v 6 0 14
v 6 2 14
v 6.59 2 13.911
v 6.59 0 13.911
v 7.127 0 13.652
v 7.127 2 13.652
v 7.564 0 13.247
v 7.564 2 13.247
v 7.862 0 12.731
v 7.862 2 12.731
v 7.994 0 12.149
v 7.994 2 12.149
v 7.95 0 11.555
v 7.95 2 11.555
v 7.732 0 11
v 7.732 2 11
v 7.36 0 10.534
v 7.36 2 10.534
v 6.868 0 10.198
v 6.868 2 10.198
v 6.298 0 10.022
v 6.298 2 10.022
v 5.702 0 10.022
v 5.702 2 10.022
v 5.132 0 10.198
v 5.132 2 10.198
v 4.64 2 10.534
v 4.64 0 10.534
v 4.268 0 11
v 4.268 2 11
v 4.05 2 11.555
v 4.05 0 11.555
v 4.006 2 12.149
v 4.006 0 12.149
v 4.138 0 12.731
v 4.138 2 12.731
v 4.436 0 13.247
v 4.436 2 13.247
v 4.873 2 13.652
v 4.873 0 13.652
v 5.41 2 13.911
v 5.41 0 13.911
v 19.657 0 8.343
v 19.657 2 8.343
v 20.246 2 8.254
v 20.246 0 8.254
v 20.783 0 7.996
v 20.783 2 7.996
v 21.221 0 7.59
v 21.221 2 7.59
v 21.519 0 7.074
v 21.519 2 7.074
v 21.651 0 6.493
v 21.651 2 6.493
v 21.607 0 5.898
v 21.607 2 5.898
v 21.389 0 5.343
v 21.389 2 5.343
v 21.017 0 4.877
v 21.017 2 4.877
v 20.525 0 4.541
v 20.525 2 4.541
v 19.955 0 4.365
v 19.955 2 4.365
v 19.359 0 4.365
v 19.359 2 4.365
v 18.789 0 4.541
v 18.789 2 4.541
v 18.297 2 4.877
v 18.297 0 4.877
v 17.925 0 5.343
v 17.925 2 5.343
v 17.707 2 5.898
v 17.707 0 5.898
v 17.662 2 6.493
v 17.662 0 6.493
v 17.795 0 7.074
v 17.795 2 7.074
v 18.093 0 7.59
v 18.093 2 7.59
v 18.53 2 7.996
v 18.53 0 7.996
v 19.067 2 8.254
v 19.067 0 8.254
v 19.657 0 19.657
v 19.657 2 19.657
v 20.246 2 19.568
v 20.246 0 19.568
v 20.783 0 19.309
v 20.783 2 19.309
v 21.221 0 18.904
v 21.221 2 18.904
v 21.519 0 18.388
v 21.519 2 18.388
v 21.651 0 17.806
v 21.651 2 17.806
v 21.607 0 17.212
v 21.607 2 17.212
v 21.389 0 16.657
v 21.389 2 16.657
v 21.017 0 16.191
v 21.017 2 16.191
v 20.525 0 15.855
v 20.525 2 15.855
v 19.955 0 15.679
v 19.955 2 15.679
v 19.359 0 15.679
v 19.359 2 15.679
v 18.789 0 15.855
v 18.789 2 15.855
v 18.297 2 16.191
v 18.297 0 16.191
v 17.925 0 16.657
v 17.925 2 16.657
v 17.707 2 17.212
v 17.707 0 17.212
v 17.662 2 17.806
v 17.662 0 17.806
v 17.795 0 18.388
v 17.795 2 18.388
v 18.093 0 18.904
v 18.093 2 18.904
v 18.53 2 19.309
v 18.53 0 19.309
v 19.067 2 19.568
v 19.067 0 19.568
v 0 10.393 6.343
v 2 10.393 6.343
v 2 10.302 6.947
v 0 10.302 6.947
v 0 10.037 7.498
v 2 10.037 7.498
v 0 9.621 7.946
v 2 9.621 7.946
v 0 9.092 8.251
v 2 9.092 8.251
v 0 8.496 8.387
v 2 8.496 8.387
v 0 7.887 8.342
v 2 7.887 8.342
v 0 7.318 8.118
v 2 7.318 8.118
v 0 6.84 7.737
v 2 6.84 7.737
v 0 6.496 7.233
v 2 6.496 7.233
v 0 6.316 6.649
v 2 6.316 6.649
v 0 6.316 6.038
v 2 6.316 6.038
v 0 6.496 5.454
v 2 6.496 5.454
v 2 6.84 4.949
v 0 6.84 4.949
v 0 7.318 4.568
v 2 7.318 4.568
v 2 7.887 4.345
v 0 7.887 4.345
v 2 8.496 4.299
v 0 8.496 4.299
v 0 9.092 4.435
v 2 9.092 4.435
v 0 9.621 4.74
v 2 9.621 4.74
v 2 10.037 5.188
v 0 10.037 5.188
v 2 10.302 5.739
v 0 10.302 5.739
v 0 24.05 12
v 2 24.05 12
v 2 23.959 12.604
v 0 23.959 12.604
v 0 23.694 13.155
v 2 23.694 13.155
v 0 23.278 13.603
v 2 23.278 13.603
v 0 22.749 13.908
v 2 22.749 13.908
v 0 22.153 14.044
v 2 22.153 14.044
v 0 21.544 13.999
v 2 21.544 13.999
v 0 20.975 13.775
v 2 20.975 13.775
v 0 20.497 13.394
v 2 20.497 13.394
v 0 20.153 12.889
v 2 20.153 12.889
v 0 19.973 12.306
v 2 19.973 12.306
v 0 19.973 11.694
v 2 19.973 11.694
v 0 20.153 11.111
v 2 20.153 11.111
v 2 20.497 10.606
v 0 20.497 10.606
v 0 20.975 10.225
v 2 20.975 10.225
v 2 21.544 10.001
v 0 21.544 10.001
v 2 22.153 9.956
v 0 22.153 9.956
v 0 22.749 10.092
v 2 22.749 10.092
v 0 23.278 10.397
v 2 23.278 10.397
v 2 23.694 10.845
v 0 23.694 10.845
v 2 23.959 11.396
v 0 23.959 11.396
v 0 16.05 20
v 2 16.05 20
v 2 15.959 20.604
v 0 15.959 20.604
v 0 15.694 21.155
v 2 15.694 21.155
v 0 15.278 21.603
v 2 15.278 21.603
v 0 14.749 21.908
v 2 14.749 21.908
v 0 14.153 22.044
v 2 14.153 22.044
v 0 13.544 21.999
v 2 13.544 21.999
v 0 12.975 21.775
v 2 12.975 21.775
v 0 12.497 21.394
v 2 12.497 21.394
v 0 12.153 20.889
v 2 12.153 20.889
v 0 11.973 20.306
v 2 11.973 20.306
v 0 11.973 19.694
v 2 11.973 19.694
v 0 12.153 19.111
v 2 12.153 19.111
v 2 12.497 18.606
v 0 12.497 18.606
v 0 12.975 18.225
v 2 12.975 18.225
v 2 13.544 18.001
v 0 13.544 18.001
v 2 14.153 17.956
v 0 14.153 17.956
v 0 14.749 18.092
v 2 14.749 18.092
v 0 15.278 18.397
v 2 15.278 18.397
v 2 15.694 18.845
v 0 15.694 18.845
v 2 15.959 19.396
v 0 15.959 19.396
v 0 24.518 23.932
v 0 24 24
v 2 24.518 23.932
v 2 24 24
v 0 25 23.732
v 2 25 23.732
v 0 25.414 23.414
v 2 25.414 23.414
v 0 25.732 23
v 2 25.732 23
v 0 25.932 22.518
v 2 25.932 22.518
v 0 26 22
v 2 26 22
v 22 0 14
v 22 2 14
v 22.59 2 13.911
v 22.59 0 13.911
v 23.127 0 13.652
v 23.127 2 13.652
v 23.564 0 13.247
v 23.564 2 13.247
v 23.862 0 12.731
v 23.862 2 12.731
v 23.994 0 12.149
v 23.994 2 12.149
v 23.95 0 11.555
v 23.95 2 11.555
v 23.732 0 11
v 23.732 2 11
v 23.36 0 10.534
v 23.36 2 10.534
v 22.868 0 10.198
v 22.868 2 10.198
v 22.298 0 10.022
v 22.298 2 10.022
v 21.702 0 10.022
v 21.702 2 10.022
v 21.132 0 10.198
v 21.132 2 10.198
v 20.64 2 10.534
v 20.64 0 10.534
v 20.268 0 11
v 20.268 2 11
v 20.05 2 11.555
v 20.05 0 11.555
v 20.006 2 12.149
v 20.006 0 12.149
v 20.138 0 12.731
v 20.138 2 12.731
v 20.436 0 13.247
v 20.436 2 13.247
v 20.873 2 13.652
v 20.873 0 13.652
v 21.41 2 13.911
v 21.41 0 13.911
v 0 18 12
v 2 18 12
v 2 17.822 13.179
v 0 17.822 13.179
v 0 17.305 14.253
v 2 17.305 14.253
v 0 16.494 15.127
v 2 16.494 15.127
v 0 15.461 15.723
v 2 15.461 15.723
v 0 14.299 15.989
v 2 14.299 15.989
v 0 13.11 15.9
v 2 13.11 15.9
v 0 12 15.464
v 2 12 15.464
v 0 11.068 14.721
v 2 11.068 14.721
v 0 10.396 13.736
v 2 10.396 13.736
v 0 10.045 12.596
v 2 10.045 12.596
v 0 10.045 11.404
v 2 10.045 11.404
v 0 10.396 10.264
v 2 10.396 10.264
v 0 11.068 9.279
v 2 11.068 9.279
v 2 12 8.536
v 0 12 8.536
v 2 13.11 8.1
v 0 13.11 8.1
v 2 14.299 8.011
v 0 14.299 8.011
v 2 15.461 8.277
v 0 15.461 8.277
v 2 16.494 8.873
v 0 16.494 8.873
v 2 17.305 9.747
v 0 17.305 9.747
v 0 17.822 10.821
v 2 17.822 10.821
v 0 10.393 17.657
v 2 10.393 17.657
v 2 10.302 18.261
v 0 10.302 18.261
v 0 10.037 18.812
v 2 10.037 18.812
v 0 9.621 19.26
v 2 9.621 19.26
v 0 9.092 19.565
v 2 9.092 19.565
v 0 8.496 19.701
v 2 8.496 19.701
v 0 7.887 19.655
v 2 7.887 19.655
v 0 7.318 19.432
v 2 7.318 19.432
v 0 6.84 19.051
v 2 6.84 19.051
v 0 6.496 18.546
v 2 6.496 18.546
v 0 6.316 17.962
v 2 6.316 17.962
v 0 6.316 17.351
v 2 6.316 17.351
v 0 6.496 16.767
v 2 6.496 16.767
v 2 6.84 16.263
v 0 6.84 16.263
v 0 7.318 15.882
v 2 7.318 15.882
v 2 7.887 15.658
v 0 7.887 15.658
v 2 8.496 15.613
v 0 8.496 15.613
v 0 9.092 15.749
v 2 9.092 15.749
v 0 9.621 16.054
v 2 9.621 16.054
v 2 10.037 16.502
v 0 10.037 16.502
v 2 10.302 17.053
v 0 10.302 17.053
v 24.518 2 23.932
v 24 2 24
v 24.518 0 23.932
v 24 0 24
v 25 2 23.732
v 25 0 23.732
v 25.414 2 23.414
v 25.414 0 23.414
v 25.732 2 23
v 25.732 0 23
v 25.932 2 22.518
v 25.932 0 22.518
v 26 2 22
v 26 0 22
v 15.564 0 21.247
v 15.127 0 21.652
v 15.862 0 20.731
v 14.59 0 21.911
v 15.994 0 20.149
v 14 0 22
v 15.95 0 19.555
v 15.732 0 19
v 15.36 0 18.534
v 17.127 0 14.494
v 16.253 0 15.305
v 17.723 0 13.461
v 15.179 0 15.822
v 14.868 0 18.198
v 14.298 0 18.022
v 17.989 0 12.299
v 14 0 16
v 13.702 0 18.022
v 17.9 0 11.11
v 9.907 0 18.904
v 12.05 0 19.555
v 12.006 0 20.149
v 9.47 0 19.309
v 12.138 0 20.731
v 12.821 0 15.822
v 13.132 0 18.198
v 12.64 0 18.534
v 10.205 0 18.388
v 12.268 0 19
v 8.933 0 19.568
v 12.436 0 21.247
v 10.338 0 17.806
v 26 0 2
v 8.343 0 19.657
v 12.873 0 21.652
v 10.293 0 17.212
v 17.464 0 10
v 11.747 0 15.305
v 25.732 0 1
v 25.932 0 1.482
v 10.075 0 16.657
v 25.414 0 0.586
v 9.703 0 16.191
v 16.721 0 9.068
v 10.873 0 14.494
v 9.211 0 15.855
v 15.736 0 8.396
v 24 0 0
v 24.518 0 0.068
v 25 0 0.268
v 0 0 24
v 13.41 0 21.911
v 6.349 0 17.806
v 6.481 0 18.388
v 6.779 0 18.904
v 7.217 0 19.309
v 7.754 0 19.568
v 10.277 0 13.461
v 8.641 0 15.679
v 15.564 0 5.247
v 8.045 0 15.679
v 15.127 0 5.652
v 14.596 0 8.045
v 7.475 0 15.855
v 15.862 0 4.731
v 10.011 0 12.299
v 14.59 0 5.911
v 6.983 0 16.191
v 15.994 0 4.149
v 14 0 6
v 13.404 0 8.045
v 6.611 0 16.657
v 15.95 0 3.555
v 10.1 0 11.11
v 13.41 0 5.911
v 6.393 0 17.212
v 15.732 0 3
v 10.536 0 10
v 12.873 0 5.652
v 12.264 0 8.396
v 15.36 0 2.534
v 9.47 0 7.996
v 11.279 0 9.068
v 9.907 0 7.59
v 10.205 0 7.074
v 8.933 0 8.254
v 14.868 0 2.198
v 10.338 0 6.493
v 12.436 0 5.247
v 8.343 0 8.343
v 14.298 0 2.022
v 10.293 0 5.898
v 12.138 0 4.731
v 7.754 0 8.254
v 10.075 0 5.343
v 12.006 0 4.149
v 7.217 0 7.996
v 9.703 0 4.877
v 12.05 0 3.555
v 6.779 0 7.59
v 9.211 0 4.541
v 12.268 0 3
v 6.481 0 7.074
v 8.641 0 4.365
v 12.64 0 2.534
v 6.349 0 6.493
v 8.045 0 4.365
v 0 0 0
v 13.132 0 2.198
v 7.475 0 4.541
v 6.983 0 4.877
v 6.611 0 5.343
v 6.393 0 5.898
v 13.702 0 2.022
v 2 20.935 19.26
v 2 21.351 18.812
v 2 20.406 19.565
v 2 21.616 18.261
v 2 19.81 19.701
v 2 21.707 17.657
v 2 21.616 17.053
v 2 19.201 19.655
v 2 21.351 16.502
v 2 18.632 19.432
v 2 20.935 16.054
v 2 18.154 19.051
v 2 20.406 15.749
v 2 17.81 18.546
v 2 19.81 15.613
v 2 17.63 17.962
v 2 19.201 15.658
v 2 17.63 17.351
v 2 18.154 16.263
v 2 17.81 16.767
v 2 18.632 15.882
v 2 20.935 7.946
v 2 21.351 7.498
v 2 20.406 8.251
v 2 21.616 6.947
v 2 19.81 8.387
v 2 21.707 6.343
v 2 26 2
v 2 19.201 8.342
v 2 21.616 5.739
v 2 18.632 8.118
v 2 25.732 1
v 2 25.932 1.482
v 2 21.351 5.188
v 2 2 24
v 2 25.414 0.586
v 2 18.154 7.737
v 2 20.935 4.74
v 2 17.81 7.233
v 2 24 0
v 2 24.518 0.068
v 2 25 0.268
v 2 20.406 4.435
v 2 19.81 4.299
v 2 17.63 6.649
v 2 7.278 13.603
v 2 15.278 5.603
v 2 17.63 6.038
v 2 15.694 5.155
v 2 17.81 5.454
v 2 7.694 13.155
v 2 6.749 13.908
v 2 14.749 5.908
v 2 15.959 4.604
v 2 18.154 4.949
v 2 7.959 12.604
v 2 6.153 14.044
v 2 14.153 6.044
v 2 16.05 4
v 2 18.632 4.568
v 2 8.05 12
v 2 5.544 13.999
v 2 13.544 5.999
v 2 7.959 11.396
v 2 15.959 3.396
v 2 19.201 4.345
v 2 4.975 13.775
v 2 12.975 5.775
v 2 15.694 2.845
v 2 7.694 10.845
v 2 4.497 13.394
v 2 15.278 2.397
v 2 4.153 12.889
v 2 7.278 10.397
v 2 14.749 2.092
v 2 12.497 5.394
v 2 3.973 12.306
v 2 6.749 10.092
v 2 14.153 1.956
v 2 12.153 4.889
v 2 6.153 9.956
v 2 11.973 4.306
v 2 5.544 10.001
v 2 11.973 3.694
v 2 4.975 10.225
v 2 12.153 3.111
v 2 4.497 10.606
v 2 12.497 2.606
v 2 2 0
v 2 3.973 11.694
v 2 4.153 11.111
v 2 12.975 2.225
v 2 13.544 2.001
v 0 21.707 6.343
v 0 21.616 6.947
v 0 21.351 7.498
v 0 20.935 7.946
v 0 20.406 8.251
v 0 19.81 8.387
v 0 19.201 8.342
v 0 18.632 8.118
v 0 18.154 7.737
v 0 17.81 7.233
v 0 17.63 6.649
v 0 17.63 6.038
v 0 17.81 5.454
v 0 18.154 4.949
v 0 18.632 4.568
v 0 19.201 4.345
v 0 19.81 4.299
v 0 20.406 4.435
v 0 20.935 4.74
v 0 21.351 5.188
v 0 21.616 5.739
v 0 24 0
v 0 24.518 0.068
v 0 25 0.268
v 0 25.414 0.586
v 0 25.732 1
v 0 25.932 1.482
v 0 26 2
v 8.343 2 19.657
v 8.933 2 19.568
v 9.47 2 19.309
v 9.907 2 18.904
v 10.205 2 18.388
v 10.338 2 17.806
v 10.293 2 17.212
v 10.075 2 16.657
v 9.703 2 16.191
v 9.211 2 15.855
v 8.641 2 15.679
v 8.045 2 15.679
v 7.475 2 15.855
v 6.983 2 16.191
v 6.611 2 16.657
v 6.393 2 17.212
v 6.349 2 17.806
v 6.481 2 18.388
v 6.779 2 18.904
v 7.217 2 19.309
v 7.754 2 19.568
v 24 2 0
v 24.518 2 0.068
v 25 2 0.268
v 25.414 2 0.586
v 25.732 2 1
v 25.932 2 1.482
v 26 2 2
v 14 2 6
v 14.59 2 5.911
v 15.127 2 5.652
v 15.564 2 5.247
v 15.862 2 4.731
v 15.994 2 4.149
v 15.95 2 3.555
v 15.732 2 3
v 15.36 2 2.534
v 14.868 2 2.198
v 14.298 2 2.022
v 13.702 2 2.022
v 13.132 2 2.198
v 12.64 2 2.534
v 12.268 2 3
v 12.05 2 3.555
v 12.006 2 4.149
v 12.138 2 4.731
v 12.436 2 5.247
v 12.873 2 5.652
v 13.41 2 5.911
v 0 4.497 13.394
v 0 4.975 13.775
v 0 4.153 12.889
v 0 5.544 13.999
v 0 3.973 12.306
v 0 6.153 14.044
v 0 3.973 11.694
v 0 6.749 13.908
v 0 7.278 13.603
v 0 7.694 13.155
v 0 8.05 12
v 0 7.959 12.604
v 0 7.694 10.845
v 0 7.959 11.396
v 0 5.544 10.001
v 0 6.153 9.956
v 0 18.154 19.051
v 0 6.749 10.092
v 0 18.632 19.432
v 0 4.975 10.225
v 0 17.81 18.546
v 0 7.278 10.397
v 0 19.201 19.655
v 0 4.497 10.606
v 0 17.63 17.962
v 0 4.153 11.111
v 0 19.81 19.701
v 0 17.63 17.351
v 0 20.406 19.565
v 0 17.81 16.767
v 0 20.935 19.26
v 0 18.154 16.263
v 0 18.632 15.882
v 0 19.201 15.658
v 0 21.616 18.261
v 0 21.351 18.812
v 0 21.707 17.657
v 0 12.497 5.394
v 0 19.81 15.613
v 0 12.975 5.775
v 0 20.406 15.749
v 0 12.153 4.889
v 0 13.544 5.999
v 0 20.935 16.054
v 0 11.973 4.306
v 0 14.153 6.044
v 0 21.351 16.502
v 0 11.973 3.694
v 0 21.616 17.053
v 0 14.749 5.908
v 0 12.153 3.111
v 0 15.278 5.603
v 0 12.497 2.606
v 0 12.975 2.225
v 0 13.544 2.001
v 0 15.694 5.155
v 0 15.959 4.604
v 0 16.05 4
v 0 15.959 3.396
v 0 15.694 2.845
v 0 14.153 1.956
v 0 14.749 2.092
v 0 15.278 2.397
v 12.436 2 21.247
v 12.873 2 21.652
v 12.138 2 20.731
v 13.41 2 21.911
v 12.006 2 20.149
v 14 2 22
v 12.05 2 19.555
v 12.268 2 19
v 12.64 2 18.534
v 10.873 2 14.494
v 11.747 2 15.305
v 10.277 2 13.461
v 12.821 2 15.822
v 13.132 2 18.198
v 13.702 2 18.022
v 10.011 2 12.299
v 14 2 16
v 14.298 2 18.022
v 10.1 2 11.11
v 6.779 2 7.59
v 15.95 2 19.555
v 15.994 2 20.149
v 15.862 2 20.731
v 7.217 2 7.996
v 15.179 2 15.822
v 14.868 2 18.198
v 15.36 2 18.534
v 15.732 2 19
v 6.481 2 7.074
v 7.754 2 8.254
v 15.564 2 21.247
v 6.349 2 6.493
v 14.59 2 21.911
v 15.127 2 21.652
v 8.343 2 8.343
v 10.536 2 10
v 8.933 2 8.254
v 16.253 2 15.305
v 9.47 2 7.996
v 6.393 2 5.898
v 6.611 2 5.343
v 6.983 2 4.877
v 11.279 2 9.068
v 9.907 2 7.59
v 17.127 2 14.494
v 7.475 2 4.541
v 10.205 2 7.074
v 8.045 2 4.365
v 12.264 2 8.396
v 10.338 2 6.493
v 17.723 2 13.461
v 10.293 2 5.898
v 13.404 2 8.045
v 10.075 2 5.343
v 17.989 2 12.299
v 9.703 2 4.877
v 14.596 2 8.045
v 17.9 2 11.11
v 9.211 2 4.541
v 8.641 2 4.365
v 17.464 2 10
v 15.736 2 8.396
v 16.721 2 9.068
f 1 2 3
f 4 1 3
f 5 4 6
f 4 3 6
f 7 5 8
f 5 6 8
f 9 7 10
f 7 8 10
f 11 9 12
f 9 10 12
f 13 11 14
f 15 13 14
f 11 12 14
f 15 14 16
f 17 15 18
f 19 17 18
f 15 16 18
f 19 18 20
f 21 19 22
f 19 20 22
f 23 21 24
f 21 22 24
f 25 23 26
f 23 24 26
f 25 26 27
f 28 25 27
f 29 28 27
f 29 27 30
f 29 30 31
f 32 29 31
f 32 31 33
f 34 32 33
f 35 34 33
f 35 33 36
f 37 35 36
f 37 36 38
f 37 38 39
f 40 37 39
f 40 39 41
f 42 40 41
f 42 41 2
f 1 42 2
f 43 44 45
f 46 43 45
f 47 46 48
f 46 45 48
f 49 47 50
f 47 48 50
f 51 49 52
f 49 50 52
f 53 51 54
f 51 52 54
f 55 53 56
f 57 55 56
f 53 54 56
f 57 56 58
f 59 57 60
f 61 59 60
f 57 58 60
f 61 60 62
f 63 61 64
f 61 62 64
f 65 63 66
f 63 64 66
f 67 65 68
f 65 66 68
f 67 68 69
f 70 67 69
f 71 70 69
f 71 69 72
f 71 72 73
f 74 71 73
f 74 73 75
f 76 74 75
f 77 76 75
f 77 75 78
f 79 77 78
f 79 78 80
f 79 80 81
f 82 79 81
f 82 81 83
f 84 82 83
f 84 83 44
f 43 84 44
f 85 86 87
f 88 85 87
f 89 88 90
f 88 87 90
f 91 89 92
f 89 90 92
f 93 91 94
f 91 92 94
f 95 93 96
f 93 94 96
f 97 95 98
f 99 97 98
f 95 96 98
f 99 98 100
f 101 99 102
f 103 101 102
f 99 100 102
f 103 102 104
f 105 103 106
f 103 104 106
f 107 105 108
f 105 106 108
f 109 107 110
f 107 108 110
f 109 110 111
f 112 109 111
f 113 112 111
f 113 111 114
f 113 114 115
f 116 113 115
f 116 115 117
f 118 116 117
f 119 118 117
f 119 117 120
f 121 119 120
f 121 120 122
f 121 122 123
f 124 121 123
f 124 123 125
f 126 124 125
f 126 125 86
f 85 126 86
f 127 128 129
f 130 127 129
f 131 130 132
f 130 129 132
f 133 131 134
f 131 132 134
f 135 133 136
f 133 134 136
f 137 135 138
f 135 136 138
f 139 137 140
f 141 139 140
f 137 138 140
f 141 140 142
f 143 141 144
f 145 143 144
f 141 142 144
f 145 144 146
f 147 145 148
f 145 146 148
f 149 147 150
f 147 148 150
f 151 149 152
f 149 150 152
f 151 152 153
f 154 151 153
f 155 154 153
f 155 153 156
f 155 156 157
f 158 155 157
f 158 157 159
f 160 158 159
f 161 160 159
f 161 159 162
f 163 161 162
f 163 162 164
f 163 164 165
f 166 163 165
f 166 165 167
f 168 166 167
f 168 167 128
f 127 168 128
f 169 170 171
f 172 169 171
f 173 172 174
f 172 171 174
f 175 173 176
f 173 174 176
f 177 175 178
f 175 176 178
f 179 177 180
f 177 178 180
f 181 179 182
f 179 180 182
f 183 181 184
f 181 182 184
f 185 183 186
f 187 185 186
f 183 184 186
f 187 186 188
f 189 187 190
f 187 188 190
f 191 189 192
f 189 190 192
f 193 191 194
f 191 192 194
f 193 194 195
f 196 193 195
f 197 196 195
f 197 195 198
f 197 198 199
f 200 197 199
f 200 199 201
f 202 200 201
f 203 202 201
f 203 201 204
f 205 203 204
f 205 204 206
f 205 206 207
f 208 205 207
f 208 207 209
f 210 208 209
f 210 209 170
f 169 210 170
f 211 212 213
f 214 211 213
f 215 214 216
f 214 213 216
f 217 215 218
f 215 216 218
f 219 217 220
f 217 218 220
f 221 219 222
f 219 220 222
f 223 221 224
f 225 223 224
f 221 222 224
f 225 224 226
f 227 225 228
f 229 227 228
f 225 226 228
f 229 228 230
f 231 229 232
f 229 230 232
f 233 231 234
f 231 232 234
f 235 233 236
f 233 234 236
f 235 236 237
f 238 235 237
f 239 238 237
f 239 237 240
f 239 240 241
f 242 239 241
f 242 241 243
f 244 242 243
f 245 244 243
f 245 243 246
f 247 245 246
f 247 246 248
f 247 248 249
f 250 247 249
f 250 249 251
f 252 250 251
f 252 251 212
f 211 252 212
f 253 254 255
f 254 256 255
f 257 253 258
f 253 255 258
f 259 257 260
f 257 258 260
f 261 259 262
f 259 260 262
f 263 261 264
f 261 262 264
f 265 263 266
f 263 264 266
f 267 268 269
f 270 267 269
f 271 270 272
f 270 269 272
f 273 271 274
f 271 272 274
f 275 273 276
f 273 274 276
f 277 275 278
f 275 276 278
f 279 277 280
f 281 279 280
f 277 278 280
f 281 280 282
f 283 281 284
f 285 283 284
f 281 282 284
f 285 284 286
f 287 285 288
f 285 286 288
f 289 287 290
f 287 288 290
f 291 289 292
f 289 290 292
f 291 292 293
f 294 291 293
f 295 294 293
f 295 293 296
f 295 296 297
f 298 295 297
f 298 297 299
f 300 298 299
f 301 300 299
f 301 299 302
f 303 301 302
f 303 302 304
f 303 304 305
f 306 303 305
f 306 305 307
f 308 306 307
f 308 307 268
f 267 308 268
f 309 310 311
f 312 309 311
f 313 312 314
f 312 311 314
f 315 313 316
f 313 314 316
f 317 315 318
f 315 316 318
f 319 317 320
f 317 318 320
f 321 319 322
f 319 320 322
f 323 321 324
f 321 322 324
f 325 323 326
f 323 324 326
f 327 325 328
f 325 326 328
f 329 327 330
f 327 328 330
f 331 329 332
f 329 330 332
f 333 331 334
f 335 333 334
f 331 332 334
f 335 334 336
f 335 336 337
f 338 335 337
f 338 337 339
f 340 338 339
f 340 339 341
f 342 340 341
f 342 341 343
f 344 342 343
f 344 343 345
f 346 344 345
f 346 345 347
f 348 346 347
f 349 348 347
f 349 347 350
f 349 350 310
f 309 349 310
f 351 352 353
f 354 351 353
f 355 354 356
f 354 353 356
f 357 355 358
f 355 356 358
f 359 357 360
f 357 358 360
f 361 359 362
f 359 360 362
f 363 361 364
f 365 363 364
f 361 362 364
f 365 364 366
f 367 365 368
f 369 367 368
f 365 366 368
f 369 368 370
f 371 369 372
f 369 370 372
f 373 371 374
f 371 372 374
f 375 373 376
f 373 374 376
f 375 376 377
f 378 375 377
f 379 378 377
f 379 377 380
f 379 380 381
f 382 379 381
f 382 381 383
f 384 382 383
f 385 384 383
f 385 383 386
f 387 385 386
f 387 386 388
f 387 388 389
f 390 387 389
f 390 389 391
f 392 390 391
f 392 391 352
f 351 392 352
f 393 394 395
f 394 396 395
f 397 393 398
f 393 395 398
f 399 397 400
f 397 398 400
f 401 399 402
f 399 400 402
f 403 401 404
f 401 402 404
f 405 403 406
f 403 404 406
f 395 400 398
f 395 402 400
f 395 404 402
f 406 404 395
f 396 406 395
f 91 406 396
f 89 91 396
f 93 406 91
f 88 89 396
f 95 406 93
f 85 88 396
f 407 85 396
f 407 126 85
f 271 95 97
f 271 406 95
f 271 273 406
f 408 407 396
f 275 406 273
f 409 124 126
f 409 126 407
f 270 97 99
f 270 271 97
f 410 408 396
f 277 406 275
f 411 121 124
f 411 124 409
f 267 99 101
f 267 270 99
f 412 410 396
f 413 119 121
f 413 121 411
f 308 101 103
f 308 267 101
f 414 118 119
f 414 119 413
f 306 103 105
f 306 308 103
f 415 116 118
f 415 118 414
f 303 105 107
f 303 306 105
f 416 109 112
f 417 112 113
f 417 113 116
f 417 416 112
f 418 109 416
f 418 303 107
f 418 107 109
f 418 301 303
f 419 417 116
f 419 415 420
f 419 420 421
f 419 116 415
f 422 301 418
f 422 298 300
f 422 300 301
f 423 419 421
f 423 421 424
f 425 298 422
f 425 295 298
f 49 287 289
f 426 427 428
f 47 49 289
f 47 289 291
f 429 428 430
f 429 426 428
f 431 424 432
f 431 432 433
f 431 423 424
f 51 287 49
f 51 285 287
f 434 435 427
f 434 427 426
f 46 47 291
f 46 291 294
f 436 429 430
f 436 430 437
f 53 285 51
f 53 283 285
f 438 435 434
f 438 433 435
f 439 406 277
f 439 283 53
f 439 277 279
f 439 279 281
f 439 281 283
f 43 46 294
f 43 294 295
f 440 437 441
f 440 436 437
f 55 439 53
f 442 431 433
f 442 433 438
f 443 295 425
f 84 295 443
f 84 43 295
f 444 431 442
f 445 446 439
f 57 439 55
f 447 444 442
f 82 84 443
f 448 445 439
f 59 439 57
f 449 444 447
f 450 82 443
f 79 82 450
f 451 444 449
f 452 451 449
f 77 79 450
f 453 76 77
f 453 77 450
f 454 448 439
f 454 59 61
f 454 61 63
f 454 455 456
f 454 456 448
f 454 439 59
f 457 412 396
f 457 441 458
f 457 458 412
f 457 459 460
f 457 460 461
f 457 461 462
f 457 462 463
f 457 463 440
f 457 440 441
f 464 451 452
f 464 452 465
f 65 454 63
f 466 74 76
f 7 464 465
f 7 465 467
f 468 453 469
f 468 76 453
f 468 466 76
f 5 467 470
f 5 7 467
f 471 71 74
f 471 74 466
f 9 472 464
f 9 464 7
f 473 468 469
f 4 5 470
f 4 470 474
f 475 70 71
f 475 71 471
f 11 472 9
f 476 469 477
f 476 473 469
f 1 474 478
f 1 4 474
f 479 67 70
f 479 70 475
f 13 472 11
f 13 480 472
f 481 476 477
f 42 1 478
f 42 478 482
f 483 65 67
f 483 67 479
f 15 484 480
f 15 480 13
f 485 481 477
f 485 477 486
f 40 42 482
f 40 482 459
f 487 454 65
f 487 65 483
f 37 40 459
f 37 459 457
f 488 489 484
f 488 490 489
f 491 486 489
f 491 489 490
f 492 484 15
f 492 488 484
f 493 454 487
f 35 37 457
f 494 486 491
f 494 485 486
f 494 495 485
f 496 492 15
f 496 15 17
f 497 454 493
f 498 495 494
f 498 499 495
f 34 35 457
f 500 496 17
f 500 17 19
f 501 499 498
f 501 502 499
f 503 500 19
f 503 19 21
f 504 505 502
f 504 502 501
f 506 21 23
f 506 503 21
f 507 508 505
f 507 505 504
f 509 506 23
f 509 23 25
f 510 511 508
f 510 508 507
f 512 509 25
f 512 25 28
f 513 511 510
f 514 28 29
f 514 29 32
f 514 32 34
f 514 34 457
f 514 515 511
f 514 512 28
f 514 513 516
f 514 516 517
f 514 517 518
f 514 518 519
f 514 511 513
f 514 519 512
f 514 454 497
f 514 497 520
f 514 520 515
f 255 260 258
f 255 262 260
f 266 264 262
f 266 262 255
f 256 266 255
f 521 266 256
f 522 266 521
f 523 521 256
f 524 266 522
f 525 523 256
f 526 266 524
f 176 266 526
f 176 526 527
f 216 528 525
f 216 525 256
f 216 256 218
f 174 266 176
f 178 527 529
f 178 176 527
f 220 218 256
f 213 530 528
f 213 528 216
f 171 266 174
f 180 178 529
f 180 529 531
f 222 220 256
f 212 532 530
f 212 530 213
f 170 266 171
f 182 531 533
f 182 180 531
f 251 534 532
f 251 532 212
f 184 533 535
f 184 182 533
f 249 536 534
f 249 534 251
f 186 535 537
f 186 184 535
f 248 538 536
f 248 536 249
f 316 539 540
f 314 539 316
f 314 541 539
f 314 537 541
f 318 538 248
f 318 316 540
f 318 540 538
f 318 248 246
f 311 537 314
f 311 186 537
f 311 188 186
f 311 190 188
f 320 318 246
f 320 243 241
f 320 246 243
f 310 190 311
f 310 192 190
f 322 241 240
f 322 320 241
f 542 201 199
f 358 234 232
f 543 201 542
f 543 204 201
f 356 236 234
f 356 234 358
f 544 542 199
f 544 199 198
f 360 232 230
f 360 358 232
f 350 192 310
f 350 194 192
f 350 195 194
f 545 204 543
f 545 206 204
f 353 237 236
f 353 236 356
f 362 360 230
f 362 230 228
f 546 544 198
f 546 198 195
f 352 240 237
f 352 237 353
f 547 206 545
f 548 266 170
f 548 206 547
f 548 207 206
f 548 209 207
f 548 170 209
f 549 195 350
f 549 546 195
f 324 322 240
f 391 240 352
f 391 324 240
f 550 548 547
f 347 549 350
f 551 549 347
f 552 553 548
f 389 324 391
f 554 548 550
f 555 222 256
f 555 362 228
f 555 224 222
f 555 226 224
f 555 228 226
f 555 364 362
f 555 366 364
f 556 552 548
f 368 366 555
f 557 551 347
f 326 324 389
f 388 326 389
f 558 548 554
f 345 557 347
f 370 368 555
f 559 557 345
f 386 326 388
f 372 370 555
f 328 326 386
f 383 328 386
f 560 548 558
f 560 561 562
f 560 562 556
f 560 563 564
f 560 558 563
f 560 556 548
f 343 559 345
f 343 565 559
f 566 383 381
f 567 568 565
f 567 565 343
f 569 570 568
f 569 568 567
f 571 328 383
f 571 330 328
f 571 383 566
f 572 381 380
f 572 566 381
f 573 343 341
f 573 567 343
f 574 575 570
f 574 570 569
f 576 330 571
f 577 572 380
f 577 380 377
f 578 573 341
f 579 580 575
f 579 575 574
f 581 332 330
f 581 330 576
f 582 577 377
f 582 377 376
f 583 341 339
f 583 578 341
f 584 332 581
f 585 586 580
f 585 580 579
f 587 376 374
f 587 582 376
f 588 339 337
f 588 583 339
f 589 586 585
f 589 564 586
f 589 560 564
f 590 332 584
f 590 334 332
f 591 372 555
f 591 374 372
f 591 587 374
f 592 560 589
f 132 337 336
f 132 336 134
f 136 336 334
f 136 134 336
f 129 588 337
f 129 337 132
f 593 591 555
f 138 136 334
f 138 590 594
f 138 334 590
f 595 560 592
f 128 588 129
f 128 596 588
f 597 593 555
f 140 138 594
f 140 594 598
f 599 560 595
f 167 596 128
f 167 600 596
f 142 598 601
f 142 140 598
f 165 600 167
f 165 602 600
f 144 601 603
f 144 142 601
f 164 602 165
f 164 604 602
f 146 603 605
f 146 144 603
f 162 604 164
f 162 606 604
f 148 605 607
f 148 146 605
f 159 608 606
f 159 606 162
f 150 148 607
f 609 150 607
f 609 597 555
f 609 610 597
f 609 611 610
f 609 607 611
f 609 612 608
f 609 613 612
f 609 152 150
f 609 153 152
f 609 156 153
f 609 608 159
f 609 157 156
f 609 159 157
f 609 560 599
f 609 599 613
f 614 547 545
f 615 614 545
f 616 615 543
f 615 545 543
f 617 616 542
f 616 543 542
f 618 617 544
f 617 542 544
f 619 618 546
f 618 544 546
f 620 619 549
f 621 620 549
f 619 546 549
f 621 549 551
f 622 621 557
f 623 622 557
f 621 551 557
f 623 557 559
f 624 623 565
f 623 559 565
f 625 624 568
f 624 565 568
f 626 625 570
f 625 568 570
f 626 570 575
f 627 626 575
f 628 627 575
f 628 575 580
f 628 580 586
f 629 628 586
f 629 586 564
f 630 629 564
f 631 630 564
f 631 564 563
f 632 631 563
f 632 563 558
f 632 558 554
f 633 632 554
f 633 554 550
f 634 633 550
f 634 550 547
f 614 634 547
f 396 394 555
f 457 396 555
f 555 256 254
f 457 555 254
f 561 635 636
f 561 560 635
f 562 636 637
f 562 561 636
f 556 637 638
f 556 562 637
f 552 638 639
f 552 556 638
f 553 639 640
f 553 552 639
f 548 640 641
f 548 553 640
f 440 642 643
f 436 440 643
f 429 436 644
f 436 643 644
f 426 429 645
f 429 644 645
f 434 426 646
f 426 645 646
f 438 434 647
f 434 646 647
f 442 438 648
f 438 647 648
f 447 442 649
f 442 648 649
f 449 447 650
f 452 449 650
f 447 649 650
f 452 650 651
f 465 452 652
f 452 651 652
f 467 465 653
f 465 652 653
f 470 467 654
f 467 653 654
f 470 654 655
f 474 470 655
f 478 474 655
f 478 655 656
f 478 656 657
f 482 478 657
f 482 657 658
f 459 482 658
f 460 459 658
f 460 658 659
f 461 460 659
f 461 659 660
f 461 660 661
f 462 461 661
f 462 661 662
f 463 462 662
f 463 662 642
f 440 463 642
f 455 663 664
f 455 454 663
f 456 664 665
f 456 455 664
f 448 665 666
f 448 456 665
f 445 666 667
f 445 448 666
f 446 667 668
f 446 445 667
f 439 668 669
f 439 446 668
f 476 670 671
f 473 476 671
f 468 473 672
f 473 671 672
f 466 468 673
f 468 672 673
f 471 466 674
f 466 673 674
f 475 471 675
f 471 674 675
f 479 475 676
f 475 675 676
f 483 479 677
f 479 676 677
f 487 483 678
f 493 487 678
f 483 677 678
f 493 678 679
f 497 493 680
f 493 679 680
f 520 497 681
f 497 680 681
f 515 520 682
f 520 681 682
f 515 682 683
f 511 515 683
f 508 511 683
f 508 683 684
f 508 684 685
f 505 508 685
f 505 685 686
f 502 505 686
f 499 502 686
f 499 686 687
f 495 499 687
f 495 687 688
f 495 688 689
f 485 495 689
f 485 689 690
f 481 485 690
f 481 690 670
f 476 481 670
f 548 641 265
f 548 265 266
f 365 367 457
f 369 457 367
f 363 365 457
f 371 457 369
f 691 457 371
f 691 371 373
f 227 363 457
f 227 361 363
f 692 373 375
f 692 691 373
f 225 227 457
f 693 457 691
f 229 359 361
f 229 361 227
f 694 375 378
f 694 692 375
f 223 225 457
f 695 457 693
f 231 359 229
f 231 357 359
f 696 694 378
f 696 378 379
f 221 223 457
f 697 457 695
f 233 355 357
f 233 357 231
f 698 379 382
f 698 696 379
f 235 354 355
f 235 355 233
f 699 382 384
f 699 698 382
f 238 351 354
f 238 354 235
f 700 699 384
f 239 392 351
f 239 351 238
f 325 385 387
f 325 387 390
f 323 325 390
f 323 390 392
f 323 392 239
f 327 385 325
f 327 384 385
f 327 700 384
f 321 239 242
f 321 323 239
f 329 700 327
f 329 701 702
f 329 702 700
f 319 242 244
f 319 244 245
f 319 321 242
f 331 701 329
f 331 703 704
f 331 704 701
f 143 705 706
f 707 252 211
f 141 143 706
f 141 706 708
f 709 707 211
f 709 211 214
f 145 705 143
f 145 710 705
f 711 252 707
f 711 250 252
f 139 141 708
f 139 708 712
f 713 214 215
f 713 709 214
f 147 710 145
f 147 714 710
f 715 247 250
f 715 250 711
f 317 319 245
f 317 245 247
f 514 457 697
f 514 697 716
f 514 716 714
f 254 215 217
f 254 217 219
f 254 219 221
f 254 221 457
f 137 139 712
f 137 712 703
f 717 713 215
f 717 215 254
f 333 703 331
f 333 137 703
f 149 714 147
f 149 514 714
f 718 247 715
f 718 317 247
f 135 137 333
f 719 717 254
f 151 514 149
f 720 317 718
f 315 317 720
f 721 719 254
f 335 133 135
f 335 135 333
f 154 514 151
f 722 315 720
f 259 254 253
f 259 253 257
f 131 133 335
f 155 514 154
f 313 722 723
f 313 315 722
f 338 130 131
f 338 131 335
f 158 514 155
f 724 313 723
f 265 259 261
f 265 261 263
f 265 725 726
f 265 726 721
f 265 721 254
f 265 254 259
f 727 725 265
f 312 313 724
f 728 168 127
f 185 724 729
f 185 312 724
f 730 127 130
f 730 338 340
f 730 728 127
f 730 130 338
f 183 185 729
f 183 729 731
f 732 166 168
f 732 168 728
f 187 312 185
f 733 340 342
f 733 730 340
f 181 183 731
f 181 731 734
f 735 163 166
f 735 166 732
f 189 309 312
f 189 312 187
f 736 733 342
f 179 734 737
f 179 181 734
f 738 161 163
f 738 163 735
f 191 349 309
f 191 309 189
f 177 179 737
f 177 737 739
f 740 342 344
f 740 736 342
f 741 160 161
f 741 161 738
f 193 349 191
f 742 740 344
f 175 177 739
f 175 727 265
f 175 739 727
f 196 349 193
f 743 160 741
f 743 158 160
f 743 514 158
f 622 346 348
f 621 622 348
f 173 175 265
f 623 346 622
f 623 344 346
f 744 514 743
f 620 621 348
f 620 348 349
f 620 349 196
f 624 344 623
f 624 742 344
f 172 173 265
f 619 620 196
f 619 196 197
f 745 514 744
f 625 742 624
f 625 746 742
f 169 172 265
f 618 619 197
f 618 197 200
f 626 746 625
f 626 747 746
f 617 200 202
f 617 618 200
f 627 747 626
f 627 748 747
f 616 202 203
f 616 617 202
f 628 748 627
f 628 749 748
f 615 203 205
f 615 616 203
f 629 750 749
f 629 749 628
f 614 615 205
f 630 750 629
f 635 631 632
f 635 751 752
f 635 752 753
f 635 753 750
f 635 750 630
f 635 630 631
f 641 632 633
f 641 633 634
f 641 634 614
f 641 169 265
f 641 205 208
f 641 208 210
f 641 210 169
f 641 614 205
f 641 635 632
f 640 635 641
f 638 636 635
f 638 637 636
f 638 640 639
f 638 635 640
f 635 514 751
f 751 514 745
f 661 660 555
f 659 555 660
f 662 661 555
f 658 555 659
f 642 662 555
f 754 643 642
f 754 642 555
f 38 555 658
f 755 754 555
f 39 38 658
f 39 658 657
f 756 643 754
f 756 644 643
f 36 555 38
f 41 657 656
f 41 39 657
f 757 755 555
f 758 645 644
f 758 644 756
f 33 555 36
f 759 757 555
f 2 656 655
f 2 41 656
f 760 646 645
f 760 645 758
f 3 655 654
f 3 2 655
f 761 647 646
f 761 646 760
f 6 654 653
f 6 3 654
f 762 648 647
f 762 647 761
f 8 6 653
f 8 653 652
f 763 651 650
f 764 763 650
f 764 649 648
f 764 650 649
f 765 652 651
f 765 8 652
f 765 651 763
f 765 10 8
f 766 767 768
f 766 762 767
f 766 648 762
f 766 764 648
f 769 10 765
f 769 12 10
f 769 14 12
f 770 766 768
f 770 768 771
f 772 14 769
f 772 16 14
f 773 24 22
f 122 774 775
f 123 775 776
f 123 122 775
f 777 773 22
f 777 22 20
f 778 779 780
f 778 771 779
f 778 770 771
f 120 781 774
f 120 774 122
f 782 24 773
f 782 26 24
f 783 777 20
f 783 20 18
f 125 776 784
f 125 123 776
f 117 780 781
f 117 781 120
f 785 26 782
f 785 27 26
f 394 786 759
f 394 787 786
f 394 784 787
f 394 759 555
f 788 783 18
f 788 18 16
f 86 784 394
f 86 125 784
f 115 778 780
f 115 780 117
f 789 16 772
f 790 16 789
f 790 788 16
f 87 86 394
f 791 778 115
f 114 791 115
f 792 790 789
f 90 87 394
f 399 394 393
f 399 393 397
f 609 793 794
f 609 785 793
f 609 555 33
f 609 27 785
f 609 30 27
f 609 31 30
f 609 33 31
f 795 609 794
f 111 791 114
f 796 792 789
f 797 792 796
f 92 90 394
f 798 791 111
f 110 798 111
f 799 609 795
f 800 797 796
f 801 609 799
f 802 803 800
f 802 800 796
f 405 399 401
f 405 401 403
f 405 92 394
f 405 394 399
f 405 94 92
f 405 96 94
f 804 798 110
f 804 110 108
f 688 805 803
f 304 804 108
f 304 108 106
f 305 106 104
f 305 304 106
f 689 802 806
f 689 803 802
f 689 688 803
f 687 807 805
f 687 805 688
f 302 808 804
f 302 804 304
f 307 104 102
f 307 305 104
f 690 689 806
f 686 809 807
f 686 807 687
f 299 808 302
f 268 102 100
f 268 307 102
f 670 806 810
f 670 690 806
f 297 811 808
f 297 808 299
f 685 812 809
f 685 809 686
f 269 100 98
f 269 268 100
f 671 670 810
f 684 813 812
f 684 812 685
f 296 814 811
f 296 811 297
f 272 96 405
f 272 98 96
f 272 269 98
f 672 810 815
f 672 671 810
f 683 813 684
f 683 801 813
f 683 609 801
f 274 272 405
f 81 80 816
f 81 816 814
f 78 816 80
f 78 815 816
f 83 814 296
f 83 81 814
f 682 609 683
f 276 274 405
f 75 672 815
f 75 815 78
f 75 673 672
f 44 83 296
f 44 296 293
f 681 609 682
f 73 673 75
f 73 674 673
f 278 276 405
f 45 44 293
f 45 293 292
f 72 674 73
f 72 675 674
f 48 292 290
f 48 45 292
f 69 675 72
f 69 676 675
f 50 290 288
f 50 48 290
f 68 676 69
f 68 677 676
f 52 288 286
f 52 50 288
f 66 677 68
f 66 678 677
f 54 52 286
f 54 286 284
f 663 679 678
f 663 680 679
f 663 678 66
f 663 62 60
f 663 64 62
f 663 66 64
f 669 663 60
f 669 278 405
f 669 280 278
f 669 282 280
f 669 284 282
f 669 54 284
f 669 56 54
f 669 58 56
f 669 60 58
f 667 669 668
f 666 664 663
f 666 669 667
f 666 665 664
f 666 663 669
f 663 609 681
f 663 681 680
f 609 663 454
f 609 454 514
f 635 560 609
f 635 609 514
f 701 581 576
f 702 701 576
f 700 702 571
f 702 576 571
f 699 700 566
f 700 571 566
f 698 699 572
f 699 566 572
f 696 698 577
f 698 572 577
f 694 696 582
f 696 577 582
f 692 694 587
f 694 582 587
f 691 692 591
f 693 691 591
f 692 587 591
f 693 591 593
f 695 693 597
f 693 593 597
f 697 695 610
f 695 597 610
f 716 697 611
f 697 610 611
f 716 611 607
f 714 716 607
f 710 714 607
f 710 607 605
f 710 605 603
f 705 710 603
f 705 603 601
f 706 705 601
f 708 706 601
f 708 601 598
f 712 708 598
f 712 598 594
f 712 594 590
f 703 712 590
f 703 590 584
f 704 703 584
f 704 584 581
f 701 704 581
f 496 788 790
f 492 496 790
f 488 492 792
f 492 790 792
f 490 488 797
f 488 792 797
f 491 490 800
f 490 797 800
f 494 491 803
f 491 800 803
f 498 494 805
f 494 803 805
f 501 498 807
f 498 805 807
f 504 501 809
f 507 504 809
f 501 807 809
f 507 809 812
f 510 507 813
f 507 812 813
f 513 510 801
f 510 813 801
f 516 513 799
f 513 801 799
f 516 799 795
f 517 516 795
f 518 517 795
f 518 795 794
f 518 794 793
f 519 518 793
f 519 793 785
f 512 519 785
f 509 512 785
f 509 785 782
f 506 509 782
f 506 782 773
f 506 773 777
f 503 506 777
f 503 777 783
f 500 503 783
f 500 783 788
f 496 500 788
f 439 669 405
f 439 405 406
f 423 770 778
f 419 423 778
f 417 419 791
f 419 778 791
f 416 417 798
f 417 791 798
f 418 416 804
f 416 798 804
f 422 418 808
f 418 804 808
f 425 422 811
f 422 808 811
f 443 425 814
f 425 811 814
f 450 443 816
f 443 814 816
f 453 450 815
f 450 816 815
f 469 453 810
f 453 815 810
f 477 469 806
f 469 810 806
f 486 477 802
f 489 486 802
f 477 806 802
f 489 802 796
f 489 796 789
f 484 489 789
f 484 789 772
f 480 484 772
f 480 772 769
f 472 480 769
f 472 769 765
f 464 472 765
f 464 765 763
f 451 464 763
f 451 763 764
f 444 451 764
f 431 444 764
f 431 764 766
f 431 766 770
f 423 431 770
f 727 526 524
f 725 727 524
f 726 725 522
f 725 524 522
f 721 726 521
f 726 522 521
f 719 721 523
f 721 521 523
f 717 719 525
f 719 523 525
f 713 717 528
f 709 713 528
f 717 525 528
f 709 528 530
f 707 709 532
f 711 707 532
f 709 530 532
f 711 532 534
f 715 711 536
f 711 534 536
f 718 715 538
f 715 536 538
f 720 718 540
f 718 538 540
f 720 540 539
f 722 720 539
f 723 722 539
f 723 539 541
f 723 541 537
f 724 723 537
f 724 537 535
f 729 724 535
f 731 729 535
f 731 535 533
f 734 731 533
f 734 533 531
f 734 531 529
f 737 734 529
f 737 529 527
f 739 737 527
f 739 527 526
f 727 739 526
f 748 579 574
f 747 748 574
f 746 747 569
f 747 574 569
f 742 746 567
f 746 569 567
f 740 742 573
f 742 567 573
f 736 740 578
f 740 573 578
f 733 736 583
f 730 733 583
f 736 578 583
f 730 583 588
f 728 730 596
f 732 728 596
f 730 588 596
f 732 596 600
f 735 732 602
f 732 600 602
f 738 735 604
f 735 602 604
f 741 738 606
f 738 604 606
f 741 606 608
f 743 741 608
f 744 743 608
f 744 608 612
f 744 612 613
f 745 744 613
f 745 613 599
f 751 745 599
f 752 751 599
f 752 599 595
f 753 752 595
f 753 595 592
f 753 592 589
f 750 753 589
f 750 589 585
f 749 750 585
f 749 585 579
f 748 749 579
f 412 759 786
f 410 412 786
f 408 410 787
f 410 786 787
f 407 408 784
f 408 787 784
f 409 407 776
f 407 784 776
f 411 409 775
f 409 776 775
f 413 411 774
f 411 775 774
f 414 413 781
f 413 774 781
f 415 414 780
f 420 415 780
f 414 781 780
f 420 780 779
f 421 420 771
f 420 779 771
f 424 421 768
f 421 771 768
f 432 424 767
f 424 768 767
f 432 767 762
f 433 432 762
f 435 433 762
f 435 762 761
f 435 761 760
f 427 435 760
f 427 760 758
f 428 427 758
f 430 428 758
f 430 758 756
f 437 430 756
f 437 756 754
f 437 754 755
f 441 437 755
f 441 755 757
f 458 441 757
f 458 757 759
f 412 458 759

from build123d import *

# Parameters (mm, degrees)
BOSS_EXTRUDE1_DEPTH = 24
SKETCH2_R           = 2.05
SKETCH2_R_2         = 4
CUT_EXTRUDE1_DEPTH  = 43.755116653
SKETCH3_R           = 4
SKETCH3_R_2         = 2
CUT_EXTRUDE2_DEPTH  = 43.755116653
FILLET1_R           = 2


with BuildPart() as part:
    # Sketch1 → Boss-Extrude1 (new body)
    with BuildSketch(Plane.XY):
        Polygon((0, 0), (0, 26), (2, 26), (2, 2), (26, 2), (26, 0), align=None)
    extrude(amount=BOSS_EXTRUDE1_DEPTH)

    # Sketch2 → Cut-Extrude1 (cut, through all)
    with BuildSketch(Plane(origin=(2, 0, 0), x_dir=(0, 0, -1), z_dir=(1, 0, 0))):
        with Locations(Location((-12, 22, 0), (0, 0, 90))):
            Circle(SKETCH2_R)
        with Locations(Location((-12, 14, 0), (0, 0, 90))):
            Circle(SKETCH2_R_2)
        with Locations(Location((-6.343145751, 19.656854249, 0), (0, 0, 90))):
            Circle(SKETCH2_R)
        with Locations(Location((-4, 14, 0), (0, 0, 90))):
            Circle(SKETCH2_R)
        with Locations(Location((-6.343145751, 8.343145751, 0), (0, 0, 90))):
            Circle(SKETCH2_R)
        with Locations(Location((-12, 6, 0), (0, 0, 90))):
            Circle(SKETCH2_R)
        with Locations(Location((-17.656854249, 8.343145751, 0), (0, 0, 90))):
            Circle(SKETCH2_R)
        with Locations(Location((-20, 14, 0), (0, 0, 90))):
            Circle(SKETCH2_R)
        with Locations(Location((-17.656854249, 19.656854249, 0), (0, 0, 90))):
            Circle(SKETCH2_R)
    extrude(amount=-CUT_EXTRUDE1_DEPTH, mode=Mode.SUBTRACT)

    # Sketch3 → Cut-Extrude2 (cut, through all)
    with BuildSketch(Plane(origin=(0, 2, 0), x_dir=(1, 0, 0), z_dir=(0, 1, 0))):
        with Locations(Location((14, -12, 0), (0, 0, 270))):
            Circle(SKETCH3_R)
        with Locations(Location((22, -12, 0), (0, 0, 270))):
            Circle(SKETCH3_R_2)
        with Locations(Location((19.656854249, -17.656854249, 0), (0, 0, 270))):
            Circle(SKETCH3_R_2)
        with Locations(Location((14, -20, 0), (0, 0, 270))):
            Circle(SKETCH3_R_2)
        with Locations(Location((8.343145751, -17.656854249, 0), (0, 0, 270))):
            Circle(SKETCH3_R_2)
        with Locations(Location((6, -12, 0), (0, 0, 270))):
            Circle(SKETCH3_R_2)
        with Locations(Location((8.343145751, -6.343145751, 0), (0, 0, 270))):
            Circle(SKETCH3_R_2)
        with Locations(Location((14, -4, 0), (0, 0, 270))):
            Circle(SKETCH3_R_2)
        with Locations(Location((19.656854249, -6.343145751, 0), (0, 0, 270))):
            Circle(SKETCH3_R_2)
    extrude(amount=-CUT_EXTRUDE2_DEPTH, mode=Mode.SUBTRACT)

    # Fillet1
    fillet1_edges = [part.edges().sort_by_distance(p)[0] for p in [
        (1, 26, 24),
        (1, 26, 0),
        (26, 1, 24),
        (26, 1, 0),
    ]]
    fillet(fillet1_edges, radius=FILLET1_R)


solid = part.part
